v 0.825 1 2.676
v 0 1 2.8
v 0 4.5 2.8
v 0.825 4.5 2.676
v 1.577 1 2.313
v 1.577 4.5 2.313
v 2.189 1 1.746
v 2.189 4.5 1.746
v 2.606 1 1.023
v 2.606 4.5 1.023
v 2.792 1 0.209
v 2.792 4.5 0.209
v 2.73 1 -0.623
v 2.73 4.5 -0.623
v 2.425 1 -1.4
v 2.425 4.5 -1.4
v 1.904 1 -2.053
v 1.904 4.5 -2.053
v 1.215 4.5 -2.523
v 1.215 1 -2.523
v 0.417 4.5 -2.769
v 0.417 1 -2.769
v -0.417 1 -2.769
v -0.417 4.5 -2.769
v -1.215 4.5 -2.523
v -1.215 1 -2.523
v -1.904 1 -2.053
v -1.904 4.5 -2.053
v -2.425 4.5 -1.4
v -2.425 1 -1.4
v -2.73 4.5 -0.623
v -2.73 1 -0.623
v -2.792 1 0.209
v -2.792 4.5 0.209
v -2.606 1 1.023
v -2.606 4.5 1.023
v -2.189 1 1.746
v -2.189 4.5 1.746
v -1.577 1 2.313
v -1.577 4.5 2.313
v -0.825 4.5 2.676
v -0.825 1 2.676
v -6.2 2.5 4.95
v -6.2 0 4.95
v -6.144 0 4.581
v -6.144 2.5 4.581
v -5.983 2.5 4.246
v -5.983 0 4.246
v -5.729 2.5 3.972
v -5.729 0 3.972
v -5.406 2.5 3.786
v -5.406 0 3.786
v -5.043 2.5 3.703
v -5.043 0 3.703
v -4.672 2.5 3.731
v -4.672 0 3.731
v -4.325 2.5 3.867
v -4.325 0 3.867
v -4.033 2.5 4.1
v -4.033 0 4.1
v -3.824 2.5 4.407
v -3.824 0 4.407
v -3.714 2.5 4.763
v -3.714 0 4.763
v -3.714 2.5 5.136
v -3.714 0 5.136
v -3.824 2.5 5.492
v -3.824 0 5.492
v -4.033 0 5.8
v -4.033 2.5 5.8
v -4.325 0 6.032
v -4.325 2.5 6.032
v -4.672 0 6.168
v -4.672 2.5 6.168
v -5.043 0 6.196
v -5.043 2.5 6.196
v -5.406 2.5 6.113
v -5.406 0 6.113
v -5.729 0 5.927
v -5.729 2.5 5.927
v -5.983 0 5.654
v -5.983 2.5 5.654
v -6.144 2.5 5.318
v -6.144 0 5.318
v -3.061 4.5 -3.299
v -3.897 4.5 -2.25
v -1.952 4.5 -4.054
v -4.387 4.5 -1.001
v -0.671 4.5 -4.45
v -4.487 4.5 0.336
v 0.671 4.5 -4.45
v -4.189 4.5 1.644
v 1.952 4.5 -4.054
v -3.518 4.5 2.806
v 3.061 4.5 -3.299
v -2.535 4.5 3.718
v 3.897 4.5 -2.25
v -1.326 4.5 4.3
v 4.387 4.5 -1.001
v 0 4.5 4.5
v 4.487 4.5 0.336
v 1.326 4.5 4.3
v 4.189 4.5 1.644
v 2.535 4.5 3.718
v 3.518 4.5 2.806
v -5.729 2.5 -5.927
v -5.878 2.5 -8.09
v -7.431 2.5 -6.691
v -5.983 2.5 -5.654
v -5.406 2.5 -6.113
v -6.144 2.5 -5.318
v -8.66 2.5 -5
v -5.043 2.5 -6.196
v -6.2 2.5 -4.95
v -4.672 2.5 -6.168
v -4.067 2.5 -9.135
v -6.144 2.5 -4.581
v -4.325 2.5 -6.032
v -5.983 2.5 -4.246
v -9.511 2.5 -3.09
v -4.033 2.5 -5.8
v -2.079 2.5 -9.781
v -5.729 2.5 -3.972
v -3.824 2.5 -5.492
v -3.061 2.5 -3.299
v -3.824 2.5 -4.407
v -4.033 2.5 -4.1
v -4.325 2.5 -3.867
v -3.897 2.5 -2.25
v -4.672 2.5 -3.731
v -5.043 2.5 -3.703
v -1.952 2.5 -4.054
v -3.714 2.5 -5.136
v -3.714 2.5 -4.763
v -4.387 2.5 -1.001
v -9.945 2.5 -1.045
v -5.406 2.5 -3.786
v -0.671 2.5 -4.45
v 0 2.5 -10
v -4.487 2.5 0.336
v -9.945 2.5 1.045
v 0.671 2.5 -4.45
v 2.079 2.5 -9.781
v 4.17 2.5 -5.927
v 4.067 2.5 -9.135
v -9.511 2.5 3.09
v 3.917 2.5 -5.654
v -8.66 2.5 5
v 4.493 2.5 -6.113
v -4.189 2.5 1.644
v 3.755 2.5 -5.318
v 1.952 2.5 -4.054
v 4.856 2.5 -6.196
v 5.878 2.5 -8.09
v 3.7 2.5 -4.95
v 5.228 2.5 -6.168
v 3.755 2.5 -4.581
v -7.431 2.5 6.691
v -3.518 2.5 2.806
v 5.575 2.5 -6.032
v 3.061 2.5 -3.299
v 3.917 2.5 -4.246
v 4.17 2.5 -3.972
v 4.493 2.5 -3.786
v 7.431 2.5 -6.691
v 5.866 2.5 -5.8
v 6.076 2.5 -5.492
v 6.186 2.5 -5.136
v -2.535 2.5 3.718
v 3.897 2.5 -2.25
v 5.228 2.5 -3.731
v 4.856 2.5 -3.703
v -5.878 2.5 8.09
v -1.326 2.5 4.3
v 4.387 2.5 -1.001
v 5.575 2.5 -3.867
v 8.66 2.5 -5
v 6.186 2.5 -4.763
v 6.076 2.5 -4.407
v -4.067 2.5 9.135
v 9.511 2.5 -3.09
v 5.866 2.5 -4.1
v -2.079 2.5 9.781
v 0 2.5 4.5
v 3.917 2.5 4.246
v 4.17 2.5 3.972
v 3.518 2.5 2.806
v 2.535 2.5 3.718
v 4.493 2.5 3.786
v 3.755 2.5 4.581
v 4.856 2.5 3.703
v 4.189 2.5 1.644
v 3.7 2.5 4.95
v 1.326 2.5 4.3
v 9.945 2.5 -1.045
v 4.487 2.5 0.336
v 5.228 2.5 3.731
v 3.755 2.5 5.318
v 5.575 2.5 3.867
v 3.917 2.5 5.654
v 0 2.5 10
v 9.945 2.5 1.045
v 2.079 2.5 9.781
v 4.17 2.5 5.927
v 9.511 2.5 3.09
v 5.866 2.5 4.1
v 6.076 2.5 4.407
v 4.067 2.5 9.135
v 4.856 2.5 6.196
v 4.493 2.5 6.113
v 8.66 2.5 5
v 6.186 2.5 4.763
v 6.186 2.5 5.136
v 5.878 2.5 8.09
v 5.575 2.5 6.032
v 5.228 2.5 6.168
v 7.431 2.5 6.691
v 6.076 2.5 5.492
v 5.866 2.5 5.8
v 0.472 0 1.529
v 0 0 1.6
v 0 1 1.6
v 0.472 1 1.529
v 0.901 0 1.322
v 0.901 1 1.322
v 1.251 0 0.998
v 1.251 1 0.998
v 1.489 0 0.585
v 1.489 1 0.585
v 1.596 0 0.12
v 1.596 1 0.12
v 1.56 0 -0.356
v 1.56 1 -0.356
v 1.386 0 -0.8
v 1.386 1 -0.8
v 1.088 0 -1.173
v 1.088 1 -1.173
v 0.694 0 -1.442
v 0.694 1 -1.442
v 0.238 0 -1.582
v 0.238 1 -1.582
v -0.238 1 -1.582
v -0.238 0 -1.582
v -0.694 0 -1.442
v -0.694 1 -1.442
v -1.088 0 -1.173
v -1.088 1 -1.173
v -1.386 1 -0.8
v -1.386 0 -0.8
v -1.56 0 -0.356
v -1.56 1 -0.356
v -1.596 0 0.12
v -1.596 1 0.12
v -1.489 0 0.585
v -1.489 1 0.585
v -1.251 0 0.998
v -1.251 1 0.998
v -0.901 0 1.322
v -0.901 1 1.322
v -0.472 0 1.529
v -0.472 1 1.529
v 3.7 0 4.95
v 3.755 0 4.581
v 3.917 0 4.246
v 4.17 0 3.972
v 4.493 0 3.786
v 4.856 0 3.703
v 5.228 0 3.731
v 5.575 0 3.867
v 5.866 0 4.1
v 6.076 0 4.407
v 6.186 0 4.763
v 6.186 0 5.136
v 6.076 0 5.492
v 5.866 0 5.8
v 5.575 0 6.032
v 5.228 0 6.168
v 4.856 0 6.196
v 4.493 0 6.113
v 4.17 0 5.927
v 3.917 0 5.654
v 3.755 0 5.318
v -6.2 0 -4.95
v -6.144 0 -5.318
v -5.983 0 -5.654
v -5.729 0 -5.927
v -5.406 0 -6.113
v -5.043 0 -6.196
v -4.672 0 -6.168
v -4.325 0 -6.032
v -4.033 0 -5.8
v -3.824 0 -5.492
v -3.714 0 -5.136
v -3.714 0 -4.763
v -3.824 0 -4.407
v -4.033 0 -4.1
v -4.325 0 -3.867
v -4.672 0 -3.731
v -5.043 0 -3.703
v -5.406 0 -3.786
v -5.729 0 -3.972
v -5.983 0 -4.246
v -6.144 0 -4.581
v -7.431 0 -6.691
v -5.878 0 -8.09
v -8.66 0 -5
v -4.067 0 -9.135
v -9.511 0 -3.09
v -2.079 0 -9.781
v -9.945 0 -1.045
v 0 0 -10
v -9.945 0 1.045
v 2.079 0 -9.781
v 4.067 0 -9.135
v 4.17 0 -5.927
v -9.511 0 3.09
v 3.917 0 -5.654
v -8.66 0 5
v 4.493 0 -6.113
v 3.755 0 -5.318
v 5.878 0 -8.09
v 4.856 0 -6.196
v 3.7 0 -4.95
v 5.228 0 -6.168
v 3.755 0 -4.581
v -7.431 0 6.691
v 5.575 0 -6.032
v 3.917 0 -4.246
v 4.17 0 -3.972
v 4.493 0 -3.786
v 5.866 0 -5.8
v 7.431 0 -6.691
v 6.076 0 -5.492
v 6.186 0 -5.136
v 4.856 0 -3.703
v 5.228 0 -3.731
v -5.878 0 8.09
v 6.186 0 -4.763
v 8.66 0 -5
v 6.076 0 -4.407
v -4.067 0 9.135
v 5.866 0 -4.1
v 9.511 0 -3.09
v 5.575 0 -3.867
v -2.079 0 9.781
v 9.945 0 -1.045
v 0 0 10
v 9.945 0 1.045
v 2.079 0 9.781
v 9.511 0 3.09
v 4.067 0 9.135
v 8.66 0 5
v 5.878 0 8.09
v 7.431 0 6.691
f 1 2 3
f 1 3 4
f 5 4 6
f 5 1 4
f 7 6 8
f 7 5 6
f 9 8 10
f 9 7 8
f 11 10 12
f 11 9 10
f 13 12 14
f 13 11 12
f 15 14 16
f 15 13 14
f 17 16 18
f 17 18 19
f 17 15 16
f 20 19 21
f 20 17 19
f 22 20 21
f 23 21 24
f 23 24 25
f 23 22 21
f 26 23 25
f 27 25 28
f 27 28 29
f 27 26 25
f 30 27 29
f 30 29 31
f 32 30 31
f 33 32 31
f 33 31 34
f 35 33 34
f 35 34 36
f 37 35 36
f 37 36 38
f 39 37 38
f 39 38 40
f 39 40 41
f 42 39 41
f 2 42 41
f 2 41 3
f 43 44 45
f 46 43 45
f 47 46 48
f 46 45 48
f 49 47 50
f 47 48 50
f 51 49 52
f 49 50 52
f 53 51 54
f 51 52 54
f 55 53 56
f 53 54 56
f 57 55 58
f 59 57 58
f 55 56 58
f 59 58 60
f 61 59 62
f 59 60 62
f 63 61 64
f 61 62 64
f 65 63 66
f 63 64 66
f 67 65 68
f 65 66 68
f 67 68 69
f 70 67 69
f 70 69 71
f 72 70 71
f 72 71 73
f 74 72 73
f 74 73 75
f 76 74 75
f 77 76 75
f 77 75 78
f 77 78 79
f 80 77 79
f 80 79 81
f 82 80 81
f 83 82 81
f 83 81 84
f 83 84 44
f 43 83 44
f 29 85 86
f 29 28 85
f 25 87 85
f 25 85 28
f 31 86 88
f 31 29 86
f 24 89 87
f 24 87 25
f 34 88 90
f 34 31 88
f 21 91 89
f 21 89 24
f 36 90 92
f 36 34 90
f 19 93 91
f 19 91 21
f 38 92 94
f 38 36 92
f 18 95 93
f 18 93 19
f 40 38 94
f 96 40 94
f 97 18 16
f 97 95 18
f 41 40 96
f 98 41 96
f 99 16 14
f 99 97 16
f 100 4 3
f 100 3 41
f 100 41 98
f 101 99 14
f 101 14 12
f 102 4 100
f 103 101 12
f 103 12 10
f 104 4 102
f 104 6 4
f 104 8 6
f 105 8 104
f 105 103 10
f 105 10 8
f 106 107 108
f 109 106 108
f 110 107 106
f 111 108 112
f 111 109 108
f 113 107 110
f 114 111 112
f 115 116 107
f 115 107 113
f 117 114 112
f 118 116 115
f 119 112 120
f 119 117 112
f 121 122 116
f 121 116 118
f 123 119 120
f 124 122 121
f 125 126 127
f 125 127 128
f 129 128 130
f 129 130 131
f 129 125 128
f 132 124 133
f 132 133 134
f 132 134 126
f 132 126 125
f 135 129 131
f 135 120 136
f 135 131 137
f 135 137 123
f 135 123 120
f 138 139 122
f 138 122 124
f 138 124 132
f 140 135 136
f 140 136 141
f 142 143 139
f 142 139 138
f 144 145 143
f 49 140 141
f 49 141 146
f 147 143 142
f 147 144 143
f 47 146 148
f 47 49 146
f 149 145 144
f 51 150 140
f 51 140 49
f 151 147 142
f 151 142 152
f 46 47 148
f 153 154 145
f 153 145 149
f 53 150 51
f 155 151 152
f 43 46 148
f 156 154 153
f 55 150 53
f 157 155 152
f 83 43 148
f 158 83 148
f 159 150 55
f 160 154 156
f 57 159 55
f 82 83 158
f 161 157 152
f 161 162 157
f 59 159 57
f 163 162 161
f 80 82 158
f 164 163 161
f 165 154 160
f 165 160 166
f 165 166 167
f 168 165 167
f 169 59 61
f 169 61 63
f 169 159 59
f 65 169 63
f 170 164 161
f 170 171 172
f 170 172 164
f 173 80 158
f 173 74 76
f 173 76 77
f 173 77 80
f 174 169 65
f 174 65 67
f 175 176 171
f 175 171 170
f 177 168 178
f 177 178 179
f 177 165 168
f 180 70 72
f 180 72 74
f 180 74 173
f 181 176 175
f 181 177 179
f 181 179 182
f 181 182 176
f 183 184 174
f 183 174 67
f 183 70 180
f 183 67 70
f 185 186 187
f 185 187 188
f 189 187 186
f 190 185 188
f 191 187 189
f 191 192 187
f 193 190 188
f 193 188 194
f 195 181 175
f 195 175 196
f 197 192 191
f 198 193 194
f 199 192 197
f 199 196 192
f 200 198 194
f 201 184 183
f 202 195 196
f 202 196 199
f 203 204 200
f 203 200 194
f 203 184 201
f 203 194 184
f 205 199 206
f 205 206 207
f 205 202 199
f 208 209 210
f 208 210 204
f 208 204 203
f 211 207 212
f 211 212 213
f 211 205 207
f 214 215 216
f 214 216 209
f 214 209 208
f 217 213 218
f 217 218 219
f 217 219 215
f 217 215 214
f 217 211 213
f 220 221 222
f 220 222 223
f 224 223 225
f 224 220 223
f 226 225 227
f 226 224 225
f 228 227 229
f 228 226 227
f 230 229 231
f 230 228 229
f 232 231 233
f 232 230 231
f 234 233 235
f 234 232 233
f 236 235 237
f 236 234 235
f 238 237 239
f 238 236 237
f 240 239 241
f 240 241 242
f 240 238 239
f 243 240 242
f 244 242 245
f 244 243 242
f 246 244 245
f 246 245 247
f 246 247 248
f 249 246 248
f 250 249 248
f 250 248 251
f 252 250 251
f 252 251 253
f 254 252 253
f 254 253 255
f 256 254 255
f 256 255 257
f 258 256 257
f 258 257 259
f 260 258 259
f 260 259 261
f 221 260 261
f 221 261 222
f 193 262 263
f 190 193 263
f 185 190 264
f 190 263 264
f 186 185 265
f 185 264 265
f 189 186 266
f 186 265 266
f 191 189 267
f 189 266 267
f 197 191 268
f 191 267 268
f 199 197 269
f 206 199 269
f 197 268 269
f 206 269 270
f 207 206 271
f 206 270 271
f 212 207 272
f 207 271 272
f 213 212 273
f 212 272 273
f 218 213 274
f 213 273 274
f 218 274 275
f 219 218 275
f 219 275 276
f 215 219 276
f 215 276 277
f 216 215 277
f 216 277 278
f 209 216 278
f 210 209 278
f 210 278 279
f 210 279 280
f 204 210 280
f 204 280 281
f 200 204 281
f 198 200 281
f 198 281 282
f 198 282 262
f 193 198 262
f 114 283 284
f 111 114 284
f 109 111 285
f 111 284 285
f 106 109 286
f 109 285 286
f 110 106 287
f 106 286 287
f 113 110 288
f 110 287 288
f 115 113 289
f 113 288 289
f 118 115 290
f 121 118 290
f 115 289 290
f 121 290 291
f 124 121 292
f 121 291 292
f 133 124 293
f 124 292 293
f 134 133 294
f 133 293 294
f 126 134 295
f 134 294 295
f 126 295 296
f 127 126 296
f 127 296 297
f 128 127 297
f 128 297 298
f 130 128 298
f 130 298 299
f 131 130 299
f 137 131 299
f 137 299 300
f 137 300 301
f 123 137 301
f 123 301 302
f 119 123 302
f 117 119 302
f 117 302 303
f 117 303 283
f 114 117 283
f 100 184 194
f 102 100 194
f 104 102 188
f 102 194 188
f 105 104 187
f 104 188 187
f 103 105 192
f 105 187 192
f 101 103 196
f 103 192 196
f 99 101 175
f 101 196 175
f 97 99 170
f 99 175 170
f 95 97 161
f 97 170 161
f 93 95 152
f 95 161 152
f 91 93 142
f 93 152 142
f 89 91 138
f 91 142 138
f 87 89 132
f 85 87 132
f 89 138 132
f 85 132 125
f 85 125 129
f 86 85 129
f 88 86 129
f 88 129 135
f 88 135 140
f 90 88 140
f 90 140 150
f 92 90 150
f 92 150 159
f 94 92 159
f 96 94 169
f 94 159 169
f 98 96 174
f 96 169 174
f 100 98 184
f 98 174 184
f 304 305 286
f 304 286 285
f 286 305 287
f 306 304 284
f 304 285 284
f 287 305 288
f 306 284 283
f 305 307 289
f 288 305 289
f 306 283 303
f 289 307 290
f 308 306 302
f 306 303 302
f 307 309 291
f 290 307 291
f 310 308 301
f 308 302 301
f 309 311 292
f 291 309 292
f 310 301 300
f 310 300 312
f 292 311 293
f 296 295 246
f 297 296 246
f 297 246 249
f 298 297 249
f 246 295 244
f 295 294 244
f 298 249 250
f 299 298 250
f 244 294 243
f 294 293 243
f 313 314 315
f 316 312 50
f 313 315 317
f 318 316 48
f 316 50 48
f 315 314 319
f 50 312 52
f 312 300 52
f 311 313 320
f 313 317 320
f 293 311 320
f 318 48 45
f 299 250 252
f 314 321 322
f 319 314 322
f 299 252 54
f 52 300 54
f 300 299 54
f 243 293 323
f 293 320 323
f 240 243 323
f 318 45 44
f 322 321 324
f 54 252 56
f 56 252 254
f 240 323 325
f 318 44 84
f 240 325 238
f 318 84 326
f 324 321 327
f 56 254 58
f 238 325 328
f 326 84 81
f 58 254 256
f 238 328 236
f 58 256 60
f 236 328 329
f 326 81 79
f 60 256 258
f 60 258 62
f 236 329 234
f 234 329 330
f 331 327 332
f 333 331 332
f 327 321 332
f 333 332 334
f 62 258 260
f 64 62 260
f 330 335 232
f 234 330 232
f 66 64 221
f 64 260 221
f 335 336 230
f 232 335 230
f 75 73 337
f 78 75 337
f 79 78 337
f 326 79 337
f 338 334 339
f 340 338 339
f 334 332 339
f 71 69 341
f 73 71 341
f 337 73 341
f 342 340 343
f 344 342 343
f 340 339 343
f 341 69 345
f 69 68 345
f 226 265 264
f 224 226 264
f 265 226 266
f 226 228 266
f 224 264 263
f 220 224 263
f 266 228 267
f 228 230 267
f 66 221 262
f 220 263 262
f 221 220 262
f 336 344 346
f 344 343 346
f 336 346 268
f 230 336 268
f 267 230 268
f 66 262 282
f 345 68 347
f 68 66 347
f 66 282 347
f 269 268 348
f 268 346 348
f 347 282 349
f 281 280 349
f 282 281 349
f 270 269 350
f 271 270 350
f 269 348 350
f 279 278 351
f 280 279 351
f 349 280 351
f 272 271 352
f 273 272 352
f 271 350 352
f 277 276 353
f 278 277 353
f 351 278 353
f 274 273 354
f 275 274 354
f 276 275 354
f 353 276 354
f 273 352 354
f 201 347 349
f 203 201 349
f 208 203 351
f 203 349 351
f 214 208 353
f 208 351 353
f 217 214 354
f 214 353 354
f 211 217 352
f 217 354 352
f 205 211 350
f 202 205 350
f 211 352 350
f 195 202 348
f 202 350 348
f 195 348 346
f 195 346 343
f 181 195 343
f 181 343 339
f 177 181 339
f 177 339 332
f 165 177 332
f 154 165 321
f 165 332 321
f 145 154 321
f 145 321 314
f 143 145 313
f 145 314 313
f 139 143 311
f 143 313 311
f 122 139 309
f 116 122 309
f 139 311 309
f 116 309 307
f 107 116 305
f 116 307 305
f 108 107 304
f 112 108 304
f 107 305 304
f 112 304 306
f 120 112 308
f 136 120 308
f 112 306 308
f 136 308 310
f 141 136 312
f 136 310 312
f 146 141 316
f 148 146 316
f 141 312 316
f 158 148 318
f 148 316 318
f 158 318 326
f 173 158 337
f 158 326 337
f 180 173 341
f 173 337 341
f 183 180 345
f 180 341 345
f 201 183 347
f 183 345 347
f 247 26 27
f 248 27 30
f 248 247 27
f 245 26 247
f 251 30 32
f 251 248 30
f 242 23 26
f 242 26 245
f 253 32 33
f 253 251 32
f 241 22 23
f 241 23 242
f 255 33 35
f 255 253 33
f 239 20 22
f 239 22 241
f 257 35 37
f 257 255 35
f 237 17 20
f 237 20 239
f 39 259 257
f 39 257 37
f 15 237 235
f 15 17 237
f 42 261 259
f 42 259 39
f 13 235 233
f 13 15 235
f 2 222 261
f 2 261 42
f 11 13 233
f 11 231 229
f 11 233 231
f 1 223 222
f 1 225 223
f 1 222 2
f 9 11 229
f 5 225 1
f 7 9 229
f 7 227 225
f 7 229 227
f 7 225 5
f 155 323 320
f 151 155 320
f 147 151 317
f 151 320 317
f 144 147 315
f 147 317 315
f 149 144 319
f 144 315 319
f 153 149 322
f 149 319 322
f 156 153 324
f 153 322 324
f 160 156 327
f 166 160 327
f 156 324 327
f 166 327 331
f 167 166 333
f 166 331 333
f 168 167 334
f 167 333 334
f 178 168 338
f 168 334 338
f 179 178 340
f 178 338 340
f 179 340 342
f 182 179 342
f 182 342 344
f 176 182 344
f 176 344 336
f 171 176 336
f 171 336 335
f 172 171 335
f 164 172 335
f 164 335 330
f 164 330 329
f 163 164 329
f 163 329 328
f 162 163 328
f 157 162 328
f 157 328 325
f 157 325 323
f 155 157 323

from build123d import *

# Parameters (mm, degrees)
ESQUISSE1_R                               = 10
ESQUISSE1_R_2                             = 1.6
BOSS_EXTRU_1_DEPTH                        = 2.5
ESQUISSE2_R                               = 4.5
ESQUISSE2_R_2                             = 2.8
BOSS_EXTRU_2_DEPTH                        = 2
TROU_POUR_TARAUDAGE_POUR_TROU_TARAUD_M3_D = 2.5
ENL_V_START                               = -1.5
ESQUISSE5_R                               = 2.8
ESQUISSE5_R_2                             = 1.6
ENL_V_MAT_EXTRU_1_DEPTH                   = 1.5


with BuildPart() as part:
    # Esquisse1 → Boss.-Extru.1 (new body)
    with BuildSketch(Plane(origin=(0, 0, 0), x_dir=(1, 0, 0), z_dir=(0, 1, 0))):
        with Locations(Location((0, 0, 0), (0, 0, 270))):
            Circle(ESQUISSE1_R)
        with Locations(Location((0, 0, 0), (0, 0, 270))):
            Circle(ESQUISSE1_R_2, mode=Mode.SUBTRACT)
    extrude(amount=BOSS_EXTRU_1_DEPTH)

    # Esquisse2 → Boss.-Extru.2 (add)
    with BuildSketch(Plane(origin=(0, 2.5, 0), x_dir=(1, 0, 0), z_dir=(0, 1, 0))):
        with Locations(Location((0, 0, 0), (0, 0, 270))):
            Circle(ESQUISSE2_R)
        with Locations(Location((0, 0, 0), (0, 0, 270))):
            Circle(ESQUISSE2_R_2, mode=Mode.SUBTRACT)
    extrude(amount=BOSS_EXTRU_2_DEPTH)

    # Trou pour taraudage pour trou taraudé M31 (through all)
    with Locations(Plane(origin=(0, 2.5, 0), x_dir=(1, 0, 0), z_dir=(0, 1, 0))):
        with Locations((4.949747468, -4.949747468), (-4.949747468, -4.949747468), (-4.949747468, 4.949747468), (4.949747468, 4.949747468)):
            Hole(TROU_POUR_TARAUDAGE_POUR_TROU_TARAUD_M3_D / 2)

    # Esquisse5 → Enlèv. mat.-Extru.1 (cut)
    with BuildSketch(Plane(origin=(0, 2.5, 0), x_dir=(1, 0, 0), z_dir=(0, 1, 0)).offset(ENL_V_START)):
        with Locations(Location((0, 0, 0), (0, 0, 270))):
            Circle(ESQUISSE5_R)
        with Locations(Location((0, 0, 0), (0, 0, 270))):
            Circle(ESQUISSE5_R_2, mode=Mode.SUBTRACT)
    extrude(amount=ENL_V_MAT_EXTRU_1_DEPTH, mode=Mode.SUBTRACT)


solid = part.part
